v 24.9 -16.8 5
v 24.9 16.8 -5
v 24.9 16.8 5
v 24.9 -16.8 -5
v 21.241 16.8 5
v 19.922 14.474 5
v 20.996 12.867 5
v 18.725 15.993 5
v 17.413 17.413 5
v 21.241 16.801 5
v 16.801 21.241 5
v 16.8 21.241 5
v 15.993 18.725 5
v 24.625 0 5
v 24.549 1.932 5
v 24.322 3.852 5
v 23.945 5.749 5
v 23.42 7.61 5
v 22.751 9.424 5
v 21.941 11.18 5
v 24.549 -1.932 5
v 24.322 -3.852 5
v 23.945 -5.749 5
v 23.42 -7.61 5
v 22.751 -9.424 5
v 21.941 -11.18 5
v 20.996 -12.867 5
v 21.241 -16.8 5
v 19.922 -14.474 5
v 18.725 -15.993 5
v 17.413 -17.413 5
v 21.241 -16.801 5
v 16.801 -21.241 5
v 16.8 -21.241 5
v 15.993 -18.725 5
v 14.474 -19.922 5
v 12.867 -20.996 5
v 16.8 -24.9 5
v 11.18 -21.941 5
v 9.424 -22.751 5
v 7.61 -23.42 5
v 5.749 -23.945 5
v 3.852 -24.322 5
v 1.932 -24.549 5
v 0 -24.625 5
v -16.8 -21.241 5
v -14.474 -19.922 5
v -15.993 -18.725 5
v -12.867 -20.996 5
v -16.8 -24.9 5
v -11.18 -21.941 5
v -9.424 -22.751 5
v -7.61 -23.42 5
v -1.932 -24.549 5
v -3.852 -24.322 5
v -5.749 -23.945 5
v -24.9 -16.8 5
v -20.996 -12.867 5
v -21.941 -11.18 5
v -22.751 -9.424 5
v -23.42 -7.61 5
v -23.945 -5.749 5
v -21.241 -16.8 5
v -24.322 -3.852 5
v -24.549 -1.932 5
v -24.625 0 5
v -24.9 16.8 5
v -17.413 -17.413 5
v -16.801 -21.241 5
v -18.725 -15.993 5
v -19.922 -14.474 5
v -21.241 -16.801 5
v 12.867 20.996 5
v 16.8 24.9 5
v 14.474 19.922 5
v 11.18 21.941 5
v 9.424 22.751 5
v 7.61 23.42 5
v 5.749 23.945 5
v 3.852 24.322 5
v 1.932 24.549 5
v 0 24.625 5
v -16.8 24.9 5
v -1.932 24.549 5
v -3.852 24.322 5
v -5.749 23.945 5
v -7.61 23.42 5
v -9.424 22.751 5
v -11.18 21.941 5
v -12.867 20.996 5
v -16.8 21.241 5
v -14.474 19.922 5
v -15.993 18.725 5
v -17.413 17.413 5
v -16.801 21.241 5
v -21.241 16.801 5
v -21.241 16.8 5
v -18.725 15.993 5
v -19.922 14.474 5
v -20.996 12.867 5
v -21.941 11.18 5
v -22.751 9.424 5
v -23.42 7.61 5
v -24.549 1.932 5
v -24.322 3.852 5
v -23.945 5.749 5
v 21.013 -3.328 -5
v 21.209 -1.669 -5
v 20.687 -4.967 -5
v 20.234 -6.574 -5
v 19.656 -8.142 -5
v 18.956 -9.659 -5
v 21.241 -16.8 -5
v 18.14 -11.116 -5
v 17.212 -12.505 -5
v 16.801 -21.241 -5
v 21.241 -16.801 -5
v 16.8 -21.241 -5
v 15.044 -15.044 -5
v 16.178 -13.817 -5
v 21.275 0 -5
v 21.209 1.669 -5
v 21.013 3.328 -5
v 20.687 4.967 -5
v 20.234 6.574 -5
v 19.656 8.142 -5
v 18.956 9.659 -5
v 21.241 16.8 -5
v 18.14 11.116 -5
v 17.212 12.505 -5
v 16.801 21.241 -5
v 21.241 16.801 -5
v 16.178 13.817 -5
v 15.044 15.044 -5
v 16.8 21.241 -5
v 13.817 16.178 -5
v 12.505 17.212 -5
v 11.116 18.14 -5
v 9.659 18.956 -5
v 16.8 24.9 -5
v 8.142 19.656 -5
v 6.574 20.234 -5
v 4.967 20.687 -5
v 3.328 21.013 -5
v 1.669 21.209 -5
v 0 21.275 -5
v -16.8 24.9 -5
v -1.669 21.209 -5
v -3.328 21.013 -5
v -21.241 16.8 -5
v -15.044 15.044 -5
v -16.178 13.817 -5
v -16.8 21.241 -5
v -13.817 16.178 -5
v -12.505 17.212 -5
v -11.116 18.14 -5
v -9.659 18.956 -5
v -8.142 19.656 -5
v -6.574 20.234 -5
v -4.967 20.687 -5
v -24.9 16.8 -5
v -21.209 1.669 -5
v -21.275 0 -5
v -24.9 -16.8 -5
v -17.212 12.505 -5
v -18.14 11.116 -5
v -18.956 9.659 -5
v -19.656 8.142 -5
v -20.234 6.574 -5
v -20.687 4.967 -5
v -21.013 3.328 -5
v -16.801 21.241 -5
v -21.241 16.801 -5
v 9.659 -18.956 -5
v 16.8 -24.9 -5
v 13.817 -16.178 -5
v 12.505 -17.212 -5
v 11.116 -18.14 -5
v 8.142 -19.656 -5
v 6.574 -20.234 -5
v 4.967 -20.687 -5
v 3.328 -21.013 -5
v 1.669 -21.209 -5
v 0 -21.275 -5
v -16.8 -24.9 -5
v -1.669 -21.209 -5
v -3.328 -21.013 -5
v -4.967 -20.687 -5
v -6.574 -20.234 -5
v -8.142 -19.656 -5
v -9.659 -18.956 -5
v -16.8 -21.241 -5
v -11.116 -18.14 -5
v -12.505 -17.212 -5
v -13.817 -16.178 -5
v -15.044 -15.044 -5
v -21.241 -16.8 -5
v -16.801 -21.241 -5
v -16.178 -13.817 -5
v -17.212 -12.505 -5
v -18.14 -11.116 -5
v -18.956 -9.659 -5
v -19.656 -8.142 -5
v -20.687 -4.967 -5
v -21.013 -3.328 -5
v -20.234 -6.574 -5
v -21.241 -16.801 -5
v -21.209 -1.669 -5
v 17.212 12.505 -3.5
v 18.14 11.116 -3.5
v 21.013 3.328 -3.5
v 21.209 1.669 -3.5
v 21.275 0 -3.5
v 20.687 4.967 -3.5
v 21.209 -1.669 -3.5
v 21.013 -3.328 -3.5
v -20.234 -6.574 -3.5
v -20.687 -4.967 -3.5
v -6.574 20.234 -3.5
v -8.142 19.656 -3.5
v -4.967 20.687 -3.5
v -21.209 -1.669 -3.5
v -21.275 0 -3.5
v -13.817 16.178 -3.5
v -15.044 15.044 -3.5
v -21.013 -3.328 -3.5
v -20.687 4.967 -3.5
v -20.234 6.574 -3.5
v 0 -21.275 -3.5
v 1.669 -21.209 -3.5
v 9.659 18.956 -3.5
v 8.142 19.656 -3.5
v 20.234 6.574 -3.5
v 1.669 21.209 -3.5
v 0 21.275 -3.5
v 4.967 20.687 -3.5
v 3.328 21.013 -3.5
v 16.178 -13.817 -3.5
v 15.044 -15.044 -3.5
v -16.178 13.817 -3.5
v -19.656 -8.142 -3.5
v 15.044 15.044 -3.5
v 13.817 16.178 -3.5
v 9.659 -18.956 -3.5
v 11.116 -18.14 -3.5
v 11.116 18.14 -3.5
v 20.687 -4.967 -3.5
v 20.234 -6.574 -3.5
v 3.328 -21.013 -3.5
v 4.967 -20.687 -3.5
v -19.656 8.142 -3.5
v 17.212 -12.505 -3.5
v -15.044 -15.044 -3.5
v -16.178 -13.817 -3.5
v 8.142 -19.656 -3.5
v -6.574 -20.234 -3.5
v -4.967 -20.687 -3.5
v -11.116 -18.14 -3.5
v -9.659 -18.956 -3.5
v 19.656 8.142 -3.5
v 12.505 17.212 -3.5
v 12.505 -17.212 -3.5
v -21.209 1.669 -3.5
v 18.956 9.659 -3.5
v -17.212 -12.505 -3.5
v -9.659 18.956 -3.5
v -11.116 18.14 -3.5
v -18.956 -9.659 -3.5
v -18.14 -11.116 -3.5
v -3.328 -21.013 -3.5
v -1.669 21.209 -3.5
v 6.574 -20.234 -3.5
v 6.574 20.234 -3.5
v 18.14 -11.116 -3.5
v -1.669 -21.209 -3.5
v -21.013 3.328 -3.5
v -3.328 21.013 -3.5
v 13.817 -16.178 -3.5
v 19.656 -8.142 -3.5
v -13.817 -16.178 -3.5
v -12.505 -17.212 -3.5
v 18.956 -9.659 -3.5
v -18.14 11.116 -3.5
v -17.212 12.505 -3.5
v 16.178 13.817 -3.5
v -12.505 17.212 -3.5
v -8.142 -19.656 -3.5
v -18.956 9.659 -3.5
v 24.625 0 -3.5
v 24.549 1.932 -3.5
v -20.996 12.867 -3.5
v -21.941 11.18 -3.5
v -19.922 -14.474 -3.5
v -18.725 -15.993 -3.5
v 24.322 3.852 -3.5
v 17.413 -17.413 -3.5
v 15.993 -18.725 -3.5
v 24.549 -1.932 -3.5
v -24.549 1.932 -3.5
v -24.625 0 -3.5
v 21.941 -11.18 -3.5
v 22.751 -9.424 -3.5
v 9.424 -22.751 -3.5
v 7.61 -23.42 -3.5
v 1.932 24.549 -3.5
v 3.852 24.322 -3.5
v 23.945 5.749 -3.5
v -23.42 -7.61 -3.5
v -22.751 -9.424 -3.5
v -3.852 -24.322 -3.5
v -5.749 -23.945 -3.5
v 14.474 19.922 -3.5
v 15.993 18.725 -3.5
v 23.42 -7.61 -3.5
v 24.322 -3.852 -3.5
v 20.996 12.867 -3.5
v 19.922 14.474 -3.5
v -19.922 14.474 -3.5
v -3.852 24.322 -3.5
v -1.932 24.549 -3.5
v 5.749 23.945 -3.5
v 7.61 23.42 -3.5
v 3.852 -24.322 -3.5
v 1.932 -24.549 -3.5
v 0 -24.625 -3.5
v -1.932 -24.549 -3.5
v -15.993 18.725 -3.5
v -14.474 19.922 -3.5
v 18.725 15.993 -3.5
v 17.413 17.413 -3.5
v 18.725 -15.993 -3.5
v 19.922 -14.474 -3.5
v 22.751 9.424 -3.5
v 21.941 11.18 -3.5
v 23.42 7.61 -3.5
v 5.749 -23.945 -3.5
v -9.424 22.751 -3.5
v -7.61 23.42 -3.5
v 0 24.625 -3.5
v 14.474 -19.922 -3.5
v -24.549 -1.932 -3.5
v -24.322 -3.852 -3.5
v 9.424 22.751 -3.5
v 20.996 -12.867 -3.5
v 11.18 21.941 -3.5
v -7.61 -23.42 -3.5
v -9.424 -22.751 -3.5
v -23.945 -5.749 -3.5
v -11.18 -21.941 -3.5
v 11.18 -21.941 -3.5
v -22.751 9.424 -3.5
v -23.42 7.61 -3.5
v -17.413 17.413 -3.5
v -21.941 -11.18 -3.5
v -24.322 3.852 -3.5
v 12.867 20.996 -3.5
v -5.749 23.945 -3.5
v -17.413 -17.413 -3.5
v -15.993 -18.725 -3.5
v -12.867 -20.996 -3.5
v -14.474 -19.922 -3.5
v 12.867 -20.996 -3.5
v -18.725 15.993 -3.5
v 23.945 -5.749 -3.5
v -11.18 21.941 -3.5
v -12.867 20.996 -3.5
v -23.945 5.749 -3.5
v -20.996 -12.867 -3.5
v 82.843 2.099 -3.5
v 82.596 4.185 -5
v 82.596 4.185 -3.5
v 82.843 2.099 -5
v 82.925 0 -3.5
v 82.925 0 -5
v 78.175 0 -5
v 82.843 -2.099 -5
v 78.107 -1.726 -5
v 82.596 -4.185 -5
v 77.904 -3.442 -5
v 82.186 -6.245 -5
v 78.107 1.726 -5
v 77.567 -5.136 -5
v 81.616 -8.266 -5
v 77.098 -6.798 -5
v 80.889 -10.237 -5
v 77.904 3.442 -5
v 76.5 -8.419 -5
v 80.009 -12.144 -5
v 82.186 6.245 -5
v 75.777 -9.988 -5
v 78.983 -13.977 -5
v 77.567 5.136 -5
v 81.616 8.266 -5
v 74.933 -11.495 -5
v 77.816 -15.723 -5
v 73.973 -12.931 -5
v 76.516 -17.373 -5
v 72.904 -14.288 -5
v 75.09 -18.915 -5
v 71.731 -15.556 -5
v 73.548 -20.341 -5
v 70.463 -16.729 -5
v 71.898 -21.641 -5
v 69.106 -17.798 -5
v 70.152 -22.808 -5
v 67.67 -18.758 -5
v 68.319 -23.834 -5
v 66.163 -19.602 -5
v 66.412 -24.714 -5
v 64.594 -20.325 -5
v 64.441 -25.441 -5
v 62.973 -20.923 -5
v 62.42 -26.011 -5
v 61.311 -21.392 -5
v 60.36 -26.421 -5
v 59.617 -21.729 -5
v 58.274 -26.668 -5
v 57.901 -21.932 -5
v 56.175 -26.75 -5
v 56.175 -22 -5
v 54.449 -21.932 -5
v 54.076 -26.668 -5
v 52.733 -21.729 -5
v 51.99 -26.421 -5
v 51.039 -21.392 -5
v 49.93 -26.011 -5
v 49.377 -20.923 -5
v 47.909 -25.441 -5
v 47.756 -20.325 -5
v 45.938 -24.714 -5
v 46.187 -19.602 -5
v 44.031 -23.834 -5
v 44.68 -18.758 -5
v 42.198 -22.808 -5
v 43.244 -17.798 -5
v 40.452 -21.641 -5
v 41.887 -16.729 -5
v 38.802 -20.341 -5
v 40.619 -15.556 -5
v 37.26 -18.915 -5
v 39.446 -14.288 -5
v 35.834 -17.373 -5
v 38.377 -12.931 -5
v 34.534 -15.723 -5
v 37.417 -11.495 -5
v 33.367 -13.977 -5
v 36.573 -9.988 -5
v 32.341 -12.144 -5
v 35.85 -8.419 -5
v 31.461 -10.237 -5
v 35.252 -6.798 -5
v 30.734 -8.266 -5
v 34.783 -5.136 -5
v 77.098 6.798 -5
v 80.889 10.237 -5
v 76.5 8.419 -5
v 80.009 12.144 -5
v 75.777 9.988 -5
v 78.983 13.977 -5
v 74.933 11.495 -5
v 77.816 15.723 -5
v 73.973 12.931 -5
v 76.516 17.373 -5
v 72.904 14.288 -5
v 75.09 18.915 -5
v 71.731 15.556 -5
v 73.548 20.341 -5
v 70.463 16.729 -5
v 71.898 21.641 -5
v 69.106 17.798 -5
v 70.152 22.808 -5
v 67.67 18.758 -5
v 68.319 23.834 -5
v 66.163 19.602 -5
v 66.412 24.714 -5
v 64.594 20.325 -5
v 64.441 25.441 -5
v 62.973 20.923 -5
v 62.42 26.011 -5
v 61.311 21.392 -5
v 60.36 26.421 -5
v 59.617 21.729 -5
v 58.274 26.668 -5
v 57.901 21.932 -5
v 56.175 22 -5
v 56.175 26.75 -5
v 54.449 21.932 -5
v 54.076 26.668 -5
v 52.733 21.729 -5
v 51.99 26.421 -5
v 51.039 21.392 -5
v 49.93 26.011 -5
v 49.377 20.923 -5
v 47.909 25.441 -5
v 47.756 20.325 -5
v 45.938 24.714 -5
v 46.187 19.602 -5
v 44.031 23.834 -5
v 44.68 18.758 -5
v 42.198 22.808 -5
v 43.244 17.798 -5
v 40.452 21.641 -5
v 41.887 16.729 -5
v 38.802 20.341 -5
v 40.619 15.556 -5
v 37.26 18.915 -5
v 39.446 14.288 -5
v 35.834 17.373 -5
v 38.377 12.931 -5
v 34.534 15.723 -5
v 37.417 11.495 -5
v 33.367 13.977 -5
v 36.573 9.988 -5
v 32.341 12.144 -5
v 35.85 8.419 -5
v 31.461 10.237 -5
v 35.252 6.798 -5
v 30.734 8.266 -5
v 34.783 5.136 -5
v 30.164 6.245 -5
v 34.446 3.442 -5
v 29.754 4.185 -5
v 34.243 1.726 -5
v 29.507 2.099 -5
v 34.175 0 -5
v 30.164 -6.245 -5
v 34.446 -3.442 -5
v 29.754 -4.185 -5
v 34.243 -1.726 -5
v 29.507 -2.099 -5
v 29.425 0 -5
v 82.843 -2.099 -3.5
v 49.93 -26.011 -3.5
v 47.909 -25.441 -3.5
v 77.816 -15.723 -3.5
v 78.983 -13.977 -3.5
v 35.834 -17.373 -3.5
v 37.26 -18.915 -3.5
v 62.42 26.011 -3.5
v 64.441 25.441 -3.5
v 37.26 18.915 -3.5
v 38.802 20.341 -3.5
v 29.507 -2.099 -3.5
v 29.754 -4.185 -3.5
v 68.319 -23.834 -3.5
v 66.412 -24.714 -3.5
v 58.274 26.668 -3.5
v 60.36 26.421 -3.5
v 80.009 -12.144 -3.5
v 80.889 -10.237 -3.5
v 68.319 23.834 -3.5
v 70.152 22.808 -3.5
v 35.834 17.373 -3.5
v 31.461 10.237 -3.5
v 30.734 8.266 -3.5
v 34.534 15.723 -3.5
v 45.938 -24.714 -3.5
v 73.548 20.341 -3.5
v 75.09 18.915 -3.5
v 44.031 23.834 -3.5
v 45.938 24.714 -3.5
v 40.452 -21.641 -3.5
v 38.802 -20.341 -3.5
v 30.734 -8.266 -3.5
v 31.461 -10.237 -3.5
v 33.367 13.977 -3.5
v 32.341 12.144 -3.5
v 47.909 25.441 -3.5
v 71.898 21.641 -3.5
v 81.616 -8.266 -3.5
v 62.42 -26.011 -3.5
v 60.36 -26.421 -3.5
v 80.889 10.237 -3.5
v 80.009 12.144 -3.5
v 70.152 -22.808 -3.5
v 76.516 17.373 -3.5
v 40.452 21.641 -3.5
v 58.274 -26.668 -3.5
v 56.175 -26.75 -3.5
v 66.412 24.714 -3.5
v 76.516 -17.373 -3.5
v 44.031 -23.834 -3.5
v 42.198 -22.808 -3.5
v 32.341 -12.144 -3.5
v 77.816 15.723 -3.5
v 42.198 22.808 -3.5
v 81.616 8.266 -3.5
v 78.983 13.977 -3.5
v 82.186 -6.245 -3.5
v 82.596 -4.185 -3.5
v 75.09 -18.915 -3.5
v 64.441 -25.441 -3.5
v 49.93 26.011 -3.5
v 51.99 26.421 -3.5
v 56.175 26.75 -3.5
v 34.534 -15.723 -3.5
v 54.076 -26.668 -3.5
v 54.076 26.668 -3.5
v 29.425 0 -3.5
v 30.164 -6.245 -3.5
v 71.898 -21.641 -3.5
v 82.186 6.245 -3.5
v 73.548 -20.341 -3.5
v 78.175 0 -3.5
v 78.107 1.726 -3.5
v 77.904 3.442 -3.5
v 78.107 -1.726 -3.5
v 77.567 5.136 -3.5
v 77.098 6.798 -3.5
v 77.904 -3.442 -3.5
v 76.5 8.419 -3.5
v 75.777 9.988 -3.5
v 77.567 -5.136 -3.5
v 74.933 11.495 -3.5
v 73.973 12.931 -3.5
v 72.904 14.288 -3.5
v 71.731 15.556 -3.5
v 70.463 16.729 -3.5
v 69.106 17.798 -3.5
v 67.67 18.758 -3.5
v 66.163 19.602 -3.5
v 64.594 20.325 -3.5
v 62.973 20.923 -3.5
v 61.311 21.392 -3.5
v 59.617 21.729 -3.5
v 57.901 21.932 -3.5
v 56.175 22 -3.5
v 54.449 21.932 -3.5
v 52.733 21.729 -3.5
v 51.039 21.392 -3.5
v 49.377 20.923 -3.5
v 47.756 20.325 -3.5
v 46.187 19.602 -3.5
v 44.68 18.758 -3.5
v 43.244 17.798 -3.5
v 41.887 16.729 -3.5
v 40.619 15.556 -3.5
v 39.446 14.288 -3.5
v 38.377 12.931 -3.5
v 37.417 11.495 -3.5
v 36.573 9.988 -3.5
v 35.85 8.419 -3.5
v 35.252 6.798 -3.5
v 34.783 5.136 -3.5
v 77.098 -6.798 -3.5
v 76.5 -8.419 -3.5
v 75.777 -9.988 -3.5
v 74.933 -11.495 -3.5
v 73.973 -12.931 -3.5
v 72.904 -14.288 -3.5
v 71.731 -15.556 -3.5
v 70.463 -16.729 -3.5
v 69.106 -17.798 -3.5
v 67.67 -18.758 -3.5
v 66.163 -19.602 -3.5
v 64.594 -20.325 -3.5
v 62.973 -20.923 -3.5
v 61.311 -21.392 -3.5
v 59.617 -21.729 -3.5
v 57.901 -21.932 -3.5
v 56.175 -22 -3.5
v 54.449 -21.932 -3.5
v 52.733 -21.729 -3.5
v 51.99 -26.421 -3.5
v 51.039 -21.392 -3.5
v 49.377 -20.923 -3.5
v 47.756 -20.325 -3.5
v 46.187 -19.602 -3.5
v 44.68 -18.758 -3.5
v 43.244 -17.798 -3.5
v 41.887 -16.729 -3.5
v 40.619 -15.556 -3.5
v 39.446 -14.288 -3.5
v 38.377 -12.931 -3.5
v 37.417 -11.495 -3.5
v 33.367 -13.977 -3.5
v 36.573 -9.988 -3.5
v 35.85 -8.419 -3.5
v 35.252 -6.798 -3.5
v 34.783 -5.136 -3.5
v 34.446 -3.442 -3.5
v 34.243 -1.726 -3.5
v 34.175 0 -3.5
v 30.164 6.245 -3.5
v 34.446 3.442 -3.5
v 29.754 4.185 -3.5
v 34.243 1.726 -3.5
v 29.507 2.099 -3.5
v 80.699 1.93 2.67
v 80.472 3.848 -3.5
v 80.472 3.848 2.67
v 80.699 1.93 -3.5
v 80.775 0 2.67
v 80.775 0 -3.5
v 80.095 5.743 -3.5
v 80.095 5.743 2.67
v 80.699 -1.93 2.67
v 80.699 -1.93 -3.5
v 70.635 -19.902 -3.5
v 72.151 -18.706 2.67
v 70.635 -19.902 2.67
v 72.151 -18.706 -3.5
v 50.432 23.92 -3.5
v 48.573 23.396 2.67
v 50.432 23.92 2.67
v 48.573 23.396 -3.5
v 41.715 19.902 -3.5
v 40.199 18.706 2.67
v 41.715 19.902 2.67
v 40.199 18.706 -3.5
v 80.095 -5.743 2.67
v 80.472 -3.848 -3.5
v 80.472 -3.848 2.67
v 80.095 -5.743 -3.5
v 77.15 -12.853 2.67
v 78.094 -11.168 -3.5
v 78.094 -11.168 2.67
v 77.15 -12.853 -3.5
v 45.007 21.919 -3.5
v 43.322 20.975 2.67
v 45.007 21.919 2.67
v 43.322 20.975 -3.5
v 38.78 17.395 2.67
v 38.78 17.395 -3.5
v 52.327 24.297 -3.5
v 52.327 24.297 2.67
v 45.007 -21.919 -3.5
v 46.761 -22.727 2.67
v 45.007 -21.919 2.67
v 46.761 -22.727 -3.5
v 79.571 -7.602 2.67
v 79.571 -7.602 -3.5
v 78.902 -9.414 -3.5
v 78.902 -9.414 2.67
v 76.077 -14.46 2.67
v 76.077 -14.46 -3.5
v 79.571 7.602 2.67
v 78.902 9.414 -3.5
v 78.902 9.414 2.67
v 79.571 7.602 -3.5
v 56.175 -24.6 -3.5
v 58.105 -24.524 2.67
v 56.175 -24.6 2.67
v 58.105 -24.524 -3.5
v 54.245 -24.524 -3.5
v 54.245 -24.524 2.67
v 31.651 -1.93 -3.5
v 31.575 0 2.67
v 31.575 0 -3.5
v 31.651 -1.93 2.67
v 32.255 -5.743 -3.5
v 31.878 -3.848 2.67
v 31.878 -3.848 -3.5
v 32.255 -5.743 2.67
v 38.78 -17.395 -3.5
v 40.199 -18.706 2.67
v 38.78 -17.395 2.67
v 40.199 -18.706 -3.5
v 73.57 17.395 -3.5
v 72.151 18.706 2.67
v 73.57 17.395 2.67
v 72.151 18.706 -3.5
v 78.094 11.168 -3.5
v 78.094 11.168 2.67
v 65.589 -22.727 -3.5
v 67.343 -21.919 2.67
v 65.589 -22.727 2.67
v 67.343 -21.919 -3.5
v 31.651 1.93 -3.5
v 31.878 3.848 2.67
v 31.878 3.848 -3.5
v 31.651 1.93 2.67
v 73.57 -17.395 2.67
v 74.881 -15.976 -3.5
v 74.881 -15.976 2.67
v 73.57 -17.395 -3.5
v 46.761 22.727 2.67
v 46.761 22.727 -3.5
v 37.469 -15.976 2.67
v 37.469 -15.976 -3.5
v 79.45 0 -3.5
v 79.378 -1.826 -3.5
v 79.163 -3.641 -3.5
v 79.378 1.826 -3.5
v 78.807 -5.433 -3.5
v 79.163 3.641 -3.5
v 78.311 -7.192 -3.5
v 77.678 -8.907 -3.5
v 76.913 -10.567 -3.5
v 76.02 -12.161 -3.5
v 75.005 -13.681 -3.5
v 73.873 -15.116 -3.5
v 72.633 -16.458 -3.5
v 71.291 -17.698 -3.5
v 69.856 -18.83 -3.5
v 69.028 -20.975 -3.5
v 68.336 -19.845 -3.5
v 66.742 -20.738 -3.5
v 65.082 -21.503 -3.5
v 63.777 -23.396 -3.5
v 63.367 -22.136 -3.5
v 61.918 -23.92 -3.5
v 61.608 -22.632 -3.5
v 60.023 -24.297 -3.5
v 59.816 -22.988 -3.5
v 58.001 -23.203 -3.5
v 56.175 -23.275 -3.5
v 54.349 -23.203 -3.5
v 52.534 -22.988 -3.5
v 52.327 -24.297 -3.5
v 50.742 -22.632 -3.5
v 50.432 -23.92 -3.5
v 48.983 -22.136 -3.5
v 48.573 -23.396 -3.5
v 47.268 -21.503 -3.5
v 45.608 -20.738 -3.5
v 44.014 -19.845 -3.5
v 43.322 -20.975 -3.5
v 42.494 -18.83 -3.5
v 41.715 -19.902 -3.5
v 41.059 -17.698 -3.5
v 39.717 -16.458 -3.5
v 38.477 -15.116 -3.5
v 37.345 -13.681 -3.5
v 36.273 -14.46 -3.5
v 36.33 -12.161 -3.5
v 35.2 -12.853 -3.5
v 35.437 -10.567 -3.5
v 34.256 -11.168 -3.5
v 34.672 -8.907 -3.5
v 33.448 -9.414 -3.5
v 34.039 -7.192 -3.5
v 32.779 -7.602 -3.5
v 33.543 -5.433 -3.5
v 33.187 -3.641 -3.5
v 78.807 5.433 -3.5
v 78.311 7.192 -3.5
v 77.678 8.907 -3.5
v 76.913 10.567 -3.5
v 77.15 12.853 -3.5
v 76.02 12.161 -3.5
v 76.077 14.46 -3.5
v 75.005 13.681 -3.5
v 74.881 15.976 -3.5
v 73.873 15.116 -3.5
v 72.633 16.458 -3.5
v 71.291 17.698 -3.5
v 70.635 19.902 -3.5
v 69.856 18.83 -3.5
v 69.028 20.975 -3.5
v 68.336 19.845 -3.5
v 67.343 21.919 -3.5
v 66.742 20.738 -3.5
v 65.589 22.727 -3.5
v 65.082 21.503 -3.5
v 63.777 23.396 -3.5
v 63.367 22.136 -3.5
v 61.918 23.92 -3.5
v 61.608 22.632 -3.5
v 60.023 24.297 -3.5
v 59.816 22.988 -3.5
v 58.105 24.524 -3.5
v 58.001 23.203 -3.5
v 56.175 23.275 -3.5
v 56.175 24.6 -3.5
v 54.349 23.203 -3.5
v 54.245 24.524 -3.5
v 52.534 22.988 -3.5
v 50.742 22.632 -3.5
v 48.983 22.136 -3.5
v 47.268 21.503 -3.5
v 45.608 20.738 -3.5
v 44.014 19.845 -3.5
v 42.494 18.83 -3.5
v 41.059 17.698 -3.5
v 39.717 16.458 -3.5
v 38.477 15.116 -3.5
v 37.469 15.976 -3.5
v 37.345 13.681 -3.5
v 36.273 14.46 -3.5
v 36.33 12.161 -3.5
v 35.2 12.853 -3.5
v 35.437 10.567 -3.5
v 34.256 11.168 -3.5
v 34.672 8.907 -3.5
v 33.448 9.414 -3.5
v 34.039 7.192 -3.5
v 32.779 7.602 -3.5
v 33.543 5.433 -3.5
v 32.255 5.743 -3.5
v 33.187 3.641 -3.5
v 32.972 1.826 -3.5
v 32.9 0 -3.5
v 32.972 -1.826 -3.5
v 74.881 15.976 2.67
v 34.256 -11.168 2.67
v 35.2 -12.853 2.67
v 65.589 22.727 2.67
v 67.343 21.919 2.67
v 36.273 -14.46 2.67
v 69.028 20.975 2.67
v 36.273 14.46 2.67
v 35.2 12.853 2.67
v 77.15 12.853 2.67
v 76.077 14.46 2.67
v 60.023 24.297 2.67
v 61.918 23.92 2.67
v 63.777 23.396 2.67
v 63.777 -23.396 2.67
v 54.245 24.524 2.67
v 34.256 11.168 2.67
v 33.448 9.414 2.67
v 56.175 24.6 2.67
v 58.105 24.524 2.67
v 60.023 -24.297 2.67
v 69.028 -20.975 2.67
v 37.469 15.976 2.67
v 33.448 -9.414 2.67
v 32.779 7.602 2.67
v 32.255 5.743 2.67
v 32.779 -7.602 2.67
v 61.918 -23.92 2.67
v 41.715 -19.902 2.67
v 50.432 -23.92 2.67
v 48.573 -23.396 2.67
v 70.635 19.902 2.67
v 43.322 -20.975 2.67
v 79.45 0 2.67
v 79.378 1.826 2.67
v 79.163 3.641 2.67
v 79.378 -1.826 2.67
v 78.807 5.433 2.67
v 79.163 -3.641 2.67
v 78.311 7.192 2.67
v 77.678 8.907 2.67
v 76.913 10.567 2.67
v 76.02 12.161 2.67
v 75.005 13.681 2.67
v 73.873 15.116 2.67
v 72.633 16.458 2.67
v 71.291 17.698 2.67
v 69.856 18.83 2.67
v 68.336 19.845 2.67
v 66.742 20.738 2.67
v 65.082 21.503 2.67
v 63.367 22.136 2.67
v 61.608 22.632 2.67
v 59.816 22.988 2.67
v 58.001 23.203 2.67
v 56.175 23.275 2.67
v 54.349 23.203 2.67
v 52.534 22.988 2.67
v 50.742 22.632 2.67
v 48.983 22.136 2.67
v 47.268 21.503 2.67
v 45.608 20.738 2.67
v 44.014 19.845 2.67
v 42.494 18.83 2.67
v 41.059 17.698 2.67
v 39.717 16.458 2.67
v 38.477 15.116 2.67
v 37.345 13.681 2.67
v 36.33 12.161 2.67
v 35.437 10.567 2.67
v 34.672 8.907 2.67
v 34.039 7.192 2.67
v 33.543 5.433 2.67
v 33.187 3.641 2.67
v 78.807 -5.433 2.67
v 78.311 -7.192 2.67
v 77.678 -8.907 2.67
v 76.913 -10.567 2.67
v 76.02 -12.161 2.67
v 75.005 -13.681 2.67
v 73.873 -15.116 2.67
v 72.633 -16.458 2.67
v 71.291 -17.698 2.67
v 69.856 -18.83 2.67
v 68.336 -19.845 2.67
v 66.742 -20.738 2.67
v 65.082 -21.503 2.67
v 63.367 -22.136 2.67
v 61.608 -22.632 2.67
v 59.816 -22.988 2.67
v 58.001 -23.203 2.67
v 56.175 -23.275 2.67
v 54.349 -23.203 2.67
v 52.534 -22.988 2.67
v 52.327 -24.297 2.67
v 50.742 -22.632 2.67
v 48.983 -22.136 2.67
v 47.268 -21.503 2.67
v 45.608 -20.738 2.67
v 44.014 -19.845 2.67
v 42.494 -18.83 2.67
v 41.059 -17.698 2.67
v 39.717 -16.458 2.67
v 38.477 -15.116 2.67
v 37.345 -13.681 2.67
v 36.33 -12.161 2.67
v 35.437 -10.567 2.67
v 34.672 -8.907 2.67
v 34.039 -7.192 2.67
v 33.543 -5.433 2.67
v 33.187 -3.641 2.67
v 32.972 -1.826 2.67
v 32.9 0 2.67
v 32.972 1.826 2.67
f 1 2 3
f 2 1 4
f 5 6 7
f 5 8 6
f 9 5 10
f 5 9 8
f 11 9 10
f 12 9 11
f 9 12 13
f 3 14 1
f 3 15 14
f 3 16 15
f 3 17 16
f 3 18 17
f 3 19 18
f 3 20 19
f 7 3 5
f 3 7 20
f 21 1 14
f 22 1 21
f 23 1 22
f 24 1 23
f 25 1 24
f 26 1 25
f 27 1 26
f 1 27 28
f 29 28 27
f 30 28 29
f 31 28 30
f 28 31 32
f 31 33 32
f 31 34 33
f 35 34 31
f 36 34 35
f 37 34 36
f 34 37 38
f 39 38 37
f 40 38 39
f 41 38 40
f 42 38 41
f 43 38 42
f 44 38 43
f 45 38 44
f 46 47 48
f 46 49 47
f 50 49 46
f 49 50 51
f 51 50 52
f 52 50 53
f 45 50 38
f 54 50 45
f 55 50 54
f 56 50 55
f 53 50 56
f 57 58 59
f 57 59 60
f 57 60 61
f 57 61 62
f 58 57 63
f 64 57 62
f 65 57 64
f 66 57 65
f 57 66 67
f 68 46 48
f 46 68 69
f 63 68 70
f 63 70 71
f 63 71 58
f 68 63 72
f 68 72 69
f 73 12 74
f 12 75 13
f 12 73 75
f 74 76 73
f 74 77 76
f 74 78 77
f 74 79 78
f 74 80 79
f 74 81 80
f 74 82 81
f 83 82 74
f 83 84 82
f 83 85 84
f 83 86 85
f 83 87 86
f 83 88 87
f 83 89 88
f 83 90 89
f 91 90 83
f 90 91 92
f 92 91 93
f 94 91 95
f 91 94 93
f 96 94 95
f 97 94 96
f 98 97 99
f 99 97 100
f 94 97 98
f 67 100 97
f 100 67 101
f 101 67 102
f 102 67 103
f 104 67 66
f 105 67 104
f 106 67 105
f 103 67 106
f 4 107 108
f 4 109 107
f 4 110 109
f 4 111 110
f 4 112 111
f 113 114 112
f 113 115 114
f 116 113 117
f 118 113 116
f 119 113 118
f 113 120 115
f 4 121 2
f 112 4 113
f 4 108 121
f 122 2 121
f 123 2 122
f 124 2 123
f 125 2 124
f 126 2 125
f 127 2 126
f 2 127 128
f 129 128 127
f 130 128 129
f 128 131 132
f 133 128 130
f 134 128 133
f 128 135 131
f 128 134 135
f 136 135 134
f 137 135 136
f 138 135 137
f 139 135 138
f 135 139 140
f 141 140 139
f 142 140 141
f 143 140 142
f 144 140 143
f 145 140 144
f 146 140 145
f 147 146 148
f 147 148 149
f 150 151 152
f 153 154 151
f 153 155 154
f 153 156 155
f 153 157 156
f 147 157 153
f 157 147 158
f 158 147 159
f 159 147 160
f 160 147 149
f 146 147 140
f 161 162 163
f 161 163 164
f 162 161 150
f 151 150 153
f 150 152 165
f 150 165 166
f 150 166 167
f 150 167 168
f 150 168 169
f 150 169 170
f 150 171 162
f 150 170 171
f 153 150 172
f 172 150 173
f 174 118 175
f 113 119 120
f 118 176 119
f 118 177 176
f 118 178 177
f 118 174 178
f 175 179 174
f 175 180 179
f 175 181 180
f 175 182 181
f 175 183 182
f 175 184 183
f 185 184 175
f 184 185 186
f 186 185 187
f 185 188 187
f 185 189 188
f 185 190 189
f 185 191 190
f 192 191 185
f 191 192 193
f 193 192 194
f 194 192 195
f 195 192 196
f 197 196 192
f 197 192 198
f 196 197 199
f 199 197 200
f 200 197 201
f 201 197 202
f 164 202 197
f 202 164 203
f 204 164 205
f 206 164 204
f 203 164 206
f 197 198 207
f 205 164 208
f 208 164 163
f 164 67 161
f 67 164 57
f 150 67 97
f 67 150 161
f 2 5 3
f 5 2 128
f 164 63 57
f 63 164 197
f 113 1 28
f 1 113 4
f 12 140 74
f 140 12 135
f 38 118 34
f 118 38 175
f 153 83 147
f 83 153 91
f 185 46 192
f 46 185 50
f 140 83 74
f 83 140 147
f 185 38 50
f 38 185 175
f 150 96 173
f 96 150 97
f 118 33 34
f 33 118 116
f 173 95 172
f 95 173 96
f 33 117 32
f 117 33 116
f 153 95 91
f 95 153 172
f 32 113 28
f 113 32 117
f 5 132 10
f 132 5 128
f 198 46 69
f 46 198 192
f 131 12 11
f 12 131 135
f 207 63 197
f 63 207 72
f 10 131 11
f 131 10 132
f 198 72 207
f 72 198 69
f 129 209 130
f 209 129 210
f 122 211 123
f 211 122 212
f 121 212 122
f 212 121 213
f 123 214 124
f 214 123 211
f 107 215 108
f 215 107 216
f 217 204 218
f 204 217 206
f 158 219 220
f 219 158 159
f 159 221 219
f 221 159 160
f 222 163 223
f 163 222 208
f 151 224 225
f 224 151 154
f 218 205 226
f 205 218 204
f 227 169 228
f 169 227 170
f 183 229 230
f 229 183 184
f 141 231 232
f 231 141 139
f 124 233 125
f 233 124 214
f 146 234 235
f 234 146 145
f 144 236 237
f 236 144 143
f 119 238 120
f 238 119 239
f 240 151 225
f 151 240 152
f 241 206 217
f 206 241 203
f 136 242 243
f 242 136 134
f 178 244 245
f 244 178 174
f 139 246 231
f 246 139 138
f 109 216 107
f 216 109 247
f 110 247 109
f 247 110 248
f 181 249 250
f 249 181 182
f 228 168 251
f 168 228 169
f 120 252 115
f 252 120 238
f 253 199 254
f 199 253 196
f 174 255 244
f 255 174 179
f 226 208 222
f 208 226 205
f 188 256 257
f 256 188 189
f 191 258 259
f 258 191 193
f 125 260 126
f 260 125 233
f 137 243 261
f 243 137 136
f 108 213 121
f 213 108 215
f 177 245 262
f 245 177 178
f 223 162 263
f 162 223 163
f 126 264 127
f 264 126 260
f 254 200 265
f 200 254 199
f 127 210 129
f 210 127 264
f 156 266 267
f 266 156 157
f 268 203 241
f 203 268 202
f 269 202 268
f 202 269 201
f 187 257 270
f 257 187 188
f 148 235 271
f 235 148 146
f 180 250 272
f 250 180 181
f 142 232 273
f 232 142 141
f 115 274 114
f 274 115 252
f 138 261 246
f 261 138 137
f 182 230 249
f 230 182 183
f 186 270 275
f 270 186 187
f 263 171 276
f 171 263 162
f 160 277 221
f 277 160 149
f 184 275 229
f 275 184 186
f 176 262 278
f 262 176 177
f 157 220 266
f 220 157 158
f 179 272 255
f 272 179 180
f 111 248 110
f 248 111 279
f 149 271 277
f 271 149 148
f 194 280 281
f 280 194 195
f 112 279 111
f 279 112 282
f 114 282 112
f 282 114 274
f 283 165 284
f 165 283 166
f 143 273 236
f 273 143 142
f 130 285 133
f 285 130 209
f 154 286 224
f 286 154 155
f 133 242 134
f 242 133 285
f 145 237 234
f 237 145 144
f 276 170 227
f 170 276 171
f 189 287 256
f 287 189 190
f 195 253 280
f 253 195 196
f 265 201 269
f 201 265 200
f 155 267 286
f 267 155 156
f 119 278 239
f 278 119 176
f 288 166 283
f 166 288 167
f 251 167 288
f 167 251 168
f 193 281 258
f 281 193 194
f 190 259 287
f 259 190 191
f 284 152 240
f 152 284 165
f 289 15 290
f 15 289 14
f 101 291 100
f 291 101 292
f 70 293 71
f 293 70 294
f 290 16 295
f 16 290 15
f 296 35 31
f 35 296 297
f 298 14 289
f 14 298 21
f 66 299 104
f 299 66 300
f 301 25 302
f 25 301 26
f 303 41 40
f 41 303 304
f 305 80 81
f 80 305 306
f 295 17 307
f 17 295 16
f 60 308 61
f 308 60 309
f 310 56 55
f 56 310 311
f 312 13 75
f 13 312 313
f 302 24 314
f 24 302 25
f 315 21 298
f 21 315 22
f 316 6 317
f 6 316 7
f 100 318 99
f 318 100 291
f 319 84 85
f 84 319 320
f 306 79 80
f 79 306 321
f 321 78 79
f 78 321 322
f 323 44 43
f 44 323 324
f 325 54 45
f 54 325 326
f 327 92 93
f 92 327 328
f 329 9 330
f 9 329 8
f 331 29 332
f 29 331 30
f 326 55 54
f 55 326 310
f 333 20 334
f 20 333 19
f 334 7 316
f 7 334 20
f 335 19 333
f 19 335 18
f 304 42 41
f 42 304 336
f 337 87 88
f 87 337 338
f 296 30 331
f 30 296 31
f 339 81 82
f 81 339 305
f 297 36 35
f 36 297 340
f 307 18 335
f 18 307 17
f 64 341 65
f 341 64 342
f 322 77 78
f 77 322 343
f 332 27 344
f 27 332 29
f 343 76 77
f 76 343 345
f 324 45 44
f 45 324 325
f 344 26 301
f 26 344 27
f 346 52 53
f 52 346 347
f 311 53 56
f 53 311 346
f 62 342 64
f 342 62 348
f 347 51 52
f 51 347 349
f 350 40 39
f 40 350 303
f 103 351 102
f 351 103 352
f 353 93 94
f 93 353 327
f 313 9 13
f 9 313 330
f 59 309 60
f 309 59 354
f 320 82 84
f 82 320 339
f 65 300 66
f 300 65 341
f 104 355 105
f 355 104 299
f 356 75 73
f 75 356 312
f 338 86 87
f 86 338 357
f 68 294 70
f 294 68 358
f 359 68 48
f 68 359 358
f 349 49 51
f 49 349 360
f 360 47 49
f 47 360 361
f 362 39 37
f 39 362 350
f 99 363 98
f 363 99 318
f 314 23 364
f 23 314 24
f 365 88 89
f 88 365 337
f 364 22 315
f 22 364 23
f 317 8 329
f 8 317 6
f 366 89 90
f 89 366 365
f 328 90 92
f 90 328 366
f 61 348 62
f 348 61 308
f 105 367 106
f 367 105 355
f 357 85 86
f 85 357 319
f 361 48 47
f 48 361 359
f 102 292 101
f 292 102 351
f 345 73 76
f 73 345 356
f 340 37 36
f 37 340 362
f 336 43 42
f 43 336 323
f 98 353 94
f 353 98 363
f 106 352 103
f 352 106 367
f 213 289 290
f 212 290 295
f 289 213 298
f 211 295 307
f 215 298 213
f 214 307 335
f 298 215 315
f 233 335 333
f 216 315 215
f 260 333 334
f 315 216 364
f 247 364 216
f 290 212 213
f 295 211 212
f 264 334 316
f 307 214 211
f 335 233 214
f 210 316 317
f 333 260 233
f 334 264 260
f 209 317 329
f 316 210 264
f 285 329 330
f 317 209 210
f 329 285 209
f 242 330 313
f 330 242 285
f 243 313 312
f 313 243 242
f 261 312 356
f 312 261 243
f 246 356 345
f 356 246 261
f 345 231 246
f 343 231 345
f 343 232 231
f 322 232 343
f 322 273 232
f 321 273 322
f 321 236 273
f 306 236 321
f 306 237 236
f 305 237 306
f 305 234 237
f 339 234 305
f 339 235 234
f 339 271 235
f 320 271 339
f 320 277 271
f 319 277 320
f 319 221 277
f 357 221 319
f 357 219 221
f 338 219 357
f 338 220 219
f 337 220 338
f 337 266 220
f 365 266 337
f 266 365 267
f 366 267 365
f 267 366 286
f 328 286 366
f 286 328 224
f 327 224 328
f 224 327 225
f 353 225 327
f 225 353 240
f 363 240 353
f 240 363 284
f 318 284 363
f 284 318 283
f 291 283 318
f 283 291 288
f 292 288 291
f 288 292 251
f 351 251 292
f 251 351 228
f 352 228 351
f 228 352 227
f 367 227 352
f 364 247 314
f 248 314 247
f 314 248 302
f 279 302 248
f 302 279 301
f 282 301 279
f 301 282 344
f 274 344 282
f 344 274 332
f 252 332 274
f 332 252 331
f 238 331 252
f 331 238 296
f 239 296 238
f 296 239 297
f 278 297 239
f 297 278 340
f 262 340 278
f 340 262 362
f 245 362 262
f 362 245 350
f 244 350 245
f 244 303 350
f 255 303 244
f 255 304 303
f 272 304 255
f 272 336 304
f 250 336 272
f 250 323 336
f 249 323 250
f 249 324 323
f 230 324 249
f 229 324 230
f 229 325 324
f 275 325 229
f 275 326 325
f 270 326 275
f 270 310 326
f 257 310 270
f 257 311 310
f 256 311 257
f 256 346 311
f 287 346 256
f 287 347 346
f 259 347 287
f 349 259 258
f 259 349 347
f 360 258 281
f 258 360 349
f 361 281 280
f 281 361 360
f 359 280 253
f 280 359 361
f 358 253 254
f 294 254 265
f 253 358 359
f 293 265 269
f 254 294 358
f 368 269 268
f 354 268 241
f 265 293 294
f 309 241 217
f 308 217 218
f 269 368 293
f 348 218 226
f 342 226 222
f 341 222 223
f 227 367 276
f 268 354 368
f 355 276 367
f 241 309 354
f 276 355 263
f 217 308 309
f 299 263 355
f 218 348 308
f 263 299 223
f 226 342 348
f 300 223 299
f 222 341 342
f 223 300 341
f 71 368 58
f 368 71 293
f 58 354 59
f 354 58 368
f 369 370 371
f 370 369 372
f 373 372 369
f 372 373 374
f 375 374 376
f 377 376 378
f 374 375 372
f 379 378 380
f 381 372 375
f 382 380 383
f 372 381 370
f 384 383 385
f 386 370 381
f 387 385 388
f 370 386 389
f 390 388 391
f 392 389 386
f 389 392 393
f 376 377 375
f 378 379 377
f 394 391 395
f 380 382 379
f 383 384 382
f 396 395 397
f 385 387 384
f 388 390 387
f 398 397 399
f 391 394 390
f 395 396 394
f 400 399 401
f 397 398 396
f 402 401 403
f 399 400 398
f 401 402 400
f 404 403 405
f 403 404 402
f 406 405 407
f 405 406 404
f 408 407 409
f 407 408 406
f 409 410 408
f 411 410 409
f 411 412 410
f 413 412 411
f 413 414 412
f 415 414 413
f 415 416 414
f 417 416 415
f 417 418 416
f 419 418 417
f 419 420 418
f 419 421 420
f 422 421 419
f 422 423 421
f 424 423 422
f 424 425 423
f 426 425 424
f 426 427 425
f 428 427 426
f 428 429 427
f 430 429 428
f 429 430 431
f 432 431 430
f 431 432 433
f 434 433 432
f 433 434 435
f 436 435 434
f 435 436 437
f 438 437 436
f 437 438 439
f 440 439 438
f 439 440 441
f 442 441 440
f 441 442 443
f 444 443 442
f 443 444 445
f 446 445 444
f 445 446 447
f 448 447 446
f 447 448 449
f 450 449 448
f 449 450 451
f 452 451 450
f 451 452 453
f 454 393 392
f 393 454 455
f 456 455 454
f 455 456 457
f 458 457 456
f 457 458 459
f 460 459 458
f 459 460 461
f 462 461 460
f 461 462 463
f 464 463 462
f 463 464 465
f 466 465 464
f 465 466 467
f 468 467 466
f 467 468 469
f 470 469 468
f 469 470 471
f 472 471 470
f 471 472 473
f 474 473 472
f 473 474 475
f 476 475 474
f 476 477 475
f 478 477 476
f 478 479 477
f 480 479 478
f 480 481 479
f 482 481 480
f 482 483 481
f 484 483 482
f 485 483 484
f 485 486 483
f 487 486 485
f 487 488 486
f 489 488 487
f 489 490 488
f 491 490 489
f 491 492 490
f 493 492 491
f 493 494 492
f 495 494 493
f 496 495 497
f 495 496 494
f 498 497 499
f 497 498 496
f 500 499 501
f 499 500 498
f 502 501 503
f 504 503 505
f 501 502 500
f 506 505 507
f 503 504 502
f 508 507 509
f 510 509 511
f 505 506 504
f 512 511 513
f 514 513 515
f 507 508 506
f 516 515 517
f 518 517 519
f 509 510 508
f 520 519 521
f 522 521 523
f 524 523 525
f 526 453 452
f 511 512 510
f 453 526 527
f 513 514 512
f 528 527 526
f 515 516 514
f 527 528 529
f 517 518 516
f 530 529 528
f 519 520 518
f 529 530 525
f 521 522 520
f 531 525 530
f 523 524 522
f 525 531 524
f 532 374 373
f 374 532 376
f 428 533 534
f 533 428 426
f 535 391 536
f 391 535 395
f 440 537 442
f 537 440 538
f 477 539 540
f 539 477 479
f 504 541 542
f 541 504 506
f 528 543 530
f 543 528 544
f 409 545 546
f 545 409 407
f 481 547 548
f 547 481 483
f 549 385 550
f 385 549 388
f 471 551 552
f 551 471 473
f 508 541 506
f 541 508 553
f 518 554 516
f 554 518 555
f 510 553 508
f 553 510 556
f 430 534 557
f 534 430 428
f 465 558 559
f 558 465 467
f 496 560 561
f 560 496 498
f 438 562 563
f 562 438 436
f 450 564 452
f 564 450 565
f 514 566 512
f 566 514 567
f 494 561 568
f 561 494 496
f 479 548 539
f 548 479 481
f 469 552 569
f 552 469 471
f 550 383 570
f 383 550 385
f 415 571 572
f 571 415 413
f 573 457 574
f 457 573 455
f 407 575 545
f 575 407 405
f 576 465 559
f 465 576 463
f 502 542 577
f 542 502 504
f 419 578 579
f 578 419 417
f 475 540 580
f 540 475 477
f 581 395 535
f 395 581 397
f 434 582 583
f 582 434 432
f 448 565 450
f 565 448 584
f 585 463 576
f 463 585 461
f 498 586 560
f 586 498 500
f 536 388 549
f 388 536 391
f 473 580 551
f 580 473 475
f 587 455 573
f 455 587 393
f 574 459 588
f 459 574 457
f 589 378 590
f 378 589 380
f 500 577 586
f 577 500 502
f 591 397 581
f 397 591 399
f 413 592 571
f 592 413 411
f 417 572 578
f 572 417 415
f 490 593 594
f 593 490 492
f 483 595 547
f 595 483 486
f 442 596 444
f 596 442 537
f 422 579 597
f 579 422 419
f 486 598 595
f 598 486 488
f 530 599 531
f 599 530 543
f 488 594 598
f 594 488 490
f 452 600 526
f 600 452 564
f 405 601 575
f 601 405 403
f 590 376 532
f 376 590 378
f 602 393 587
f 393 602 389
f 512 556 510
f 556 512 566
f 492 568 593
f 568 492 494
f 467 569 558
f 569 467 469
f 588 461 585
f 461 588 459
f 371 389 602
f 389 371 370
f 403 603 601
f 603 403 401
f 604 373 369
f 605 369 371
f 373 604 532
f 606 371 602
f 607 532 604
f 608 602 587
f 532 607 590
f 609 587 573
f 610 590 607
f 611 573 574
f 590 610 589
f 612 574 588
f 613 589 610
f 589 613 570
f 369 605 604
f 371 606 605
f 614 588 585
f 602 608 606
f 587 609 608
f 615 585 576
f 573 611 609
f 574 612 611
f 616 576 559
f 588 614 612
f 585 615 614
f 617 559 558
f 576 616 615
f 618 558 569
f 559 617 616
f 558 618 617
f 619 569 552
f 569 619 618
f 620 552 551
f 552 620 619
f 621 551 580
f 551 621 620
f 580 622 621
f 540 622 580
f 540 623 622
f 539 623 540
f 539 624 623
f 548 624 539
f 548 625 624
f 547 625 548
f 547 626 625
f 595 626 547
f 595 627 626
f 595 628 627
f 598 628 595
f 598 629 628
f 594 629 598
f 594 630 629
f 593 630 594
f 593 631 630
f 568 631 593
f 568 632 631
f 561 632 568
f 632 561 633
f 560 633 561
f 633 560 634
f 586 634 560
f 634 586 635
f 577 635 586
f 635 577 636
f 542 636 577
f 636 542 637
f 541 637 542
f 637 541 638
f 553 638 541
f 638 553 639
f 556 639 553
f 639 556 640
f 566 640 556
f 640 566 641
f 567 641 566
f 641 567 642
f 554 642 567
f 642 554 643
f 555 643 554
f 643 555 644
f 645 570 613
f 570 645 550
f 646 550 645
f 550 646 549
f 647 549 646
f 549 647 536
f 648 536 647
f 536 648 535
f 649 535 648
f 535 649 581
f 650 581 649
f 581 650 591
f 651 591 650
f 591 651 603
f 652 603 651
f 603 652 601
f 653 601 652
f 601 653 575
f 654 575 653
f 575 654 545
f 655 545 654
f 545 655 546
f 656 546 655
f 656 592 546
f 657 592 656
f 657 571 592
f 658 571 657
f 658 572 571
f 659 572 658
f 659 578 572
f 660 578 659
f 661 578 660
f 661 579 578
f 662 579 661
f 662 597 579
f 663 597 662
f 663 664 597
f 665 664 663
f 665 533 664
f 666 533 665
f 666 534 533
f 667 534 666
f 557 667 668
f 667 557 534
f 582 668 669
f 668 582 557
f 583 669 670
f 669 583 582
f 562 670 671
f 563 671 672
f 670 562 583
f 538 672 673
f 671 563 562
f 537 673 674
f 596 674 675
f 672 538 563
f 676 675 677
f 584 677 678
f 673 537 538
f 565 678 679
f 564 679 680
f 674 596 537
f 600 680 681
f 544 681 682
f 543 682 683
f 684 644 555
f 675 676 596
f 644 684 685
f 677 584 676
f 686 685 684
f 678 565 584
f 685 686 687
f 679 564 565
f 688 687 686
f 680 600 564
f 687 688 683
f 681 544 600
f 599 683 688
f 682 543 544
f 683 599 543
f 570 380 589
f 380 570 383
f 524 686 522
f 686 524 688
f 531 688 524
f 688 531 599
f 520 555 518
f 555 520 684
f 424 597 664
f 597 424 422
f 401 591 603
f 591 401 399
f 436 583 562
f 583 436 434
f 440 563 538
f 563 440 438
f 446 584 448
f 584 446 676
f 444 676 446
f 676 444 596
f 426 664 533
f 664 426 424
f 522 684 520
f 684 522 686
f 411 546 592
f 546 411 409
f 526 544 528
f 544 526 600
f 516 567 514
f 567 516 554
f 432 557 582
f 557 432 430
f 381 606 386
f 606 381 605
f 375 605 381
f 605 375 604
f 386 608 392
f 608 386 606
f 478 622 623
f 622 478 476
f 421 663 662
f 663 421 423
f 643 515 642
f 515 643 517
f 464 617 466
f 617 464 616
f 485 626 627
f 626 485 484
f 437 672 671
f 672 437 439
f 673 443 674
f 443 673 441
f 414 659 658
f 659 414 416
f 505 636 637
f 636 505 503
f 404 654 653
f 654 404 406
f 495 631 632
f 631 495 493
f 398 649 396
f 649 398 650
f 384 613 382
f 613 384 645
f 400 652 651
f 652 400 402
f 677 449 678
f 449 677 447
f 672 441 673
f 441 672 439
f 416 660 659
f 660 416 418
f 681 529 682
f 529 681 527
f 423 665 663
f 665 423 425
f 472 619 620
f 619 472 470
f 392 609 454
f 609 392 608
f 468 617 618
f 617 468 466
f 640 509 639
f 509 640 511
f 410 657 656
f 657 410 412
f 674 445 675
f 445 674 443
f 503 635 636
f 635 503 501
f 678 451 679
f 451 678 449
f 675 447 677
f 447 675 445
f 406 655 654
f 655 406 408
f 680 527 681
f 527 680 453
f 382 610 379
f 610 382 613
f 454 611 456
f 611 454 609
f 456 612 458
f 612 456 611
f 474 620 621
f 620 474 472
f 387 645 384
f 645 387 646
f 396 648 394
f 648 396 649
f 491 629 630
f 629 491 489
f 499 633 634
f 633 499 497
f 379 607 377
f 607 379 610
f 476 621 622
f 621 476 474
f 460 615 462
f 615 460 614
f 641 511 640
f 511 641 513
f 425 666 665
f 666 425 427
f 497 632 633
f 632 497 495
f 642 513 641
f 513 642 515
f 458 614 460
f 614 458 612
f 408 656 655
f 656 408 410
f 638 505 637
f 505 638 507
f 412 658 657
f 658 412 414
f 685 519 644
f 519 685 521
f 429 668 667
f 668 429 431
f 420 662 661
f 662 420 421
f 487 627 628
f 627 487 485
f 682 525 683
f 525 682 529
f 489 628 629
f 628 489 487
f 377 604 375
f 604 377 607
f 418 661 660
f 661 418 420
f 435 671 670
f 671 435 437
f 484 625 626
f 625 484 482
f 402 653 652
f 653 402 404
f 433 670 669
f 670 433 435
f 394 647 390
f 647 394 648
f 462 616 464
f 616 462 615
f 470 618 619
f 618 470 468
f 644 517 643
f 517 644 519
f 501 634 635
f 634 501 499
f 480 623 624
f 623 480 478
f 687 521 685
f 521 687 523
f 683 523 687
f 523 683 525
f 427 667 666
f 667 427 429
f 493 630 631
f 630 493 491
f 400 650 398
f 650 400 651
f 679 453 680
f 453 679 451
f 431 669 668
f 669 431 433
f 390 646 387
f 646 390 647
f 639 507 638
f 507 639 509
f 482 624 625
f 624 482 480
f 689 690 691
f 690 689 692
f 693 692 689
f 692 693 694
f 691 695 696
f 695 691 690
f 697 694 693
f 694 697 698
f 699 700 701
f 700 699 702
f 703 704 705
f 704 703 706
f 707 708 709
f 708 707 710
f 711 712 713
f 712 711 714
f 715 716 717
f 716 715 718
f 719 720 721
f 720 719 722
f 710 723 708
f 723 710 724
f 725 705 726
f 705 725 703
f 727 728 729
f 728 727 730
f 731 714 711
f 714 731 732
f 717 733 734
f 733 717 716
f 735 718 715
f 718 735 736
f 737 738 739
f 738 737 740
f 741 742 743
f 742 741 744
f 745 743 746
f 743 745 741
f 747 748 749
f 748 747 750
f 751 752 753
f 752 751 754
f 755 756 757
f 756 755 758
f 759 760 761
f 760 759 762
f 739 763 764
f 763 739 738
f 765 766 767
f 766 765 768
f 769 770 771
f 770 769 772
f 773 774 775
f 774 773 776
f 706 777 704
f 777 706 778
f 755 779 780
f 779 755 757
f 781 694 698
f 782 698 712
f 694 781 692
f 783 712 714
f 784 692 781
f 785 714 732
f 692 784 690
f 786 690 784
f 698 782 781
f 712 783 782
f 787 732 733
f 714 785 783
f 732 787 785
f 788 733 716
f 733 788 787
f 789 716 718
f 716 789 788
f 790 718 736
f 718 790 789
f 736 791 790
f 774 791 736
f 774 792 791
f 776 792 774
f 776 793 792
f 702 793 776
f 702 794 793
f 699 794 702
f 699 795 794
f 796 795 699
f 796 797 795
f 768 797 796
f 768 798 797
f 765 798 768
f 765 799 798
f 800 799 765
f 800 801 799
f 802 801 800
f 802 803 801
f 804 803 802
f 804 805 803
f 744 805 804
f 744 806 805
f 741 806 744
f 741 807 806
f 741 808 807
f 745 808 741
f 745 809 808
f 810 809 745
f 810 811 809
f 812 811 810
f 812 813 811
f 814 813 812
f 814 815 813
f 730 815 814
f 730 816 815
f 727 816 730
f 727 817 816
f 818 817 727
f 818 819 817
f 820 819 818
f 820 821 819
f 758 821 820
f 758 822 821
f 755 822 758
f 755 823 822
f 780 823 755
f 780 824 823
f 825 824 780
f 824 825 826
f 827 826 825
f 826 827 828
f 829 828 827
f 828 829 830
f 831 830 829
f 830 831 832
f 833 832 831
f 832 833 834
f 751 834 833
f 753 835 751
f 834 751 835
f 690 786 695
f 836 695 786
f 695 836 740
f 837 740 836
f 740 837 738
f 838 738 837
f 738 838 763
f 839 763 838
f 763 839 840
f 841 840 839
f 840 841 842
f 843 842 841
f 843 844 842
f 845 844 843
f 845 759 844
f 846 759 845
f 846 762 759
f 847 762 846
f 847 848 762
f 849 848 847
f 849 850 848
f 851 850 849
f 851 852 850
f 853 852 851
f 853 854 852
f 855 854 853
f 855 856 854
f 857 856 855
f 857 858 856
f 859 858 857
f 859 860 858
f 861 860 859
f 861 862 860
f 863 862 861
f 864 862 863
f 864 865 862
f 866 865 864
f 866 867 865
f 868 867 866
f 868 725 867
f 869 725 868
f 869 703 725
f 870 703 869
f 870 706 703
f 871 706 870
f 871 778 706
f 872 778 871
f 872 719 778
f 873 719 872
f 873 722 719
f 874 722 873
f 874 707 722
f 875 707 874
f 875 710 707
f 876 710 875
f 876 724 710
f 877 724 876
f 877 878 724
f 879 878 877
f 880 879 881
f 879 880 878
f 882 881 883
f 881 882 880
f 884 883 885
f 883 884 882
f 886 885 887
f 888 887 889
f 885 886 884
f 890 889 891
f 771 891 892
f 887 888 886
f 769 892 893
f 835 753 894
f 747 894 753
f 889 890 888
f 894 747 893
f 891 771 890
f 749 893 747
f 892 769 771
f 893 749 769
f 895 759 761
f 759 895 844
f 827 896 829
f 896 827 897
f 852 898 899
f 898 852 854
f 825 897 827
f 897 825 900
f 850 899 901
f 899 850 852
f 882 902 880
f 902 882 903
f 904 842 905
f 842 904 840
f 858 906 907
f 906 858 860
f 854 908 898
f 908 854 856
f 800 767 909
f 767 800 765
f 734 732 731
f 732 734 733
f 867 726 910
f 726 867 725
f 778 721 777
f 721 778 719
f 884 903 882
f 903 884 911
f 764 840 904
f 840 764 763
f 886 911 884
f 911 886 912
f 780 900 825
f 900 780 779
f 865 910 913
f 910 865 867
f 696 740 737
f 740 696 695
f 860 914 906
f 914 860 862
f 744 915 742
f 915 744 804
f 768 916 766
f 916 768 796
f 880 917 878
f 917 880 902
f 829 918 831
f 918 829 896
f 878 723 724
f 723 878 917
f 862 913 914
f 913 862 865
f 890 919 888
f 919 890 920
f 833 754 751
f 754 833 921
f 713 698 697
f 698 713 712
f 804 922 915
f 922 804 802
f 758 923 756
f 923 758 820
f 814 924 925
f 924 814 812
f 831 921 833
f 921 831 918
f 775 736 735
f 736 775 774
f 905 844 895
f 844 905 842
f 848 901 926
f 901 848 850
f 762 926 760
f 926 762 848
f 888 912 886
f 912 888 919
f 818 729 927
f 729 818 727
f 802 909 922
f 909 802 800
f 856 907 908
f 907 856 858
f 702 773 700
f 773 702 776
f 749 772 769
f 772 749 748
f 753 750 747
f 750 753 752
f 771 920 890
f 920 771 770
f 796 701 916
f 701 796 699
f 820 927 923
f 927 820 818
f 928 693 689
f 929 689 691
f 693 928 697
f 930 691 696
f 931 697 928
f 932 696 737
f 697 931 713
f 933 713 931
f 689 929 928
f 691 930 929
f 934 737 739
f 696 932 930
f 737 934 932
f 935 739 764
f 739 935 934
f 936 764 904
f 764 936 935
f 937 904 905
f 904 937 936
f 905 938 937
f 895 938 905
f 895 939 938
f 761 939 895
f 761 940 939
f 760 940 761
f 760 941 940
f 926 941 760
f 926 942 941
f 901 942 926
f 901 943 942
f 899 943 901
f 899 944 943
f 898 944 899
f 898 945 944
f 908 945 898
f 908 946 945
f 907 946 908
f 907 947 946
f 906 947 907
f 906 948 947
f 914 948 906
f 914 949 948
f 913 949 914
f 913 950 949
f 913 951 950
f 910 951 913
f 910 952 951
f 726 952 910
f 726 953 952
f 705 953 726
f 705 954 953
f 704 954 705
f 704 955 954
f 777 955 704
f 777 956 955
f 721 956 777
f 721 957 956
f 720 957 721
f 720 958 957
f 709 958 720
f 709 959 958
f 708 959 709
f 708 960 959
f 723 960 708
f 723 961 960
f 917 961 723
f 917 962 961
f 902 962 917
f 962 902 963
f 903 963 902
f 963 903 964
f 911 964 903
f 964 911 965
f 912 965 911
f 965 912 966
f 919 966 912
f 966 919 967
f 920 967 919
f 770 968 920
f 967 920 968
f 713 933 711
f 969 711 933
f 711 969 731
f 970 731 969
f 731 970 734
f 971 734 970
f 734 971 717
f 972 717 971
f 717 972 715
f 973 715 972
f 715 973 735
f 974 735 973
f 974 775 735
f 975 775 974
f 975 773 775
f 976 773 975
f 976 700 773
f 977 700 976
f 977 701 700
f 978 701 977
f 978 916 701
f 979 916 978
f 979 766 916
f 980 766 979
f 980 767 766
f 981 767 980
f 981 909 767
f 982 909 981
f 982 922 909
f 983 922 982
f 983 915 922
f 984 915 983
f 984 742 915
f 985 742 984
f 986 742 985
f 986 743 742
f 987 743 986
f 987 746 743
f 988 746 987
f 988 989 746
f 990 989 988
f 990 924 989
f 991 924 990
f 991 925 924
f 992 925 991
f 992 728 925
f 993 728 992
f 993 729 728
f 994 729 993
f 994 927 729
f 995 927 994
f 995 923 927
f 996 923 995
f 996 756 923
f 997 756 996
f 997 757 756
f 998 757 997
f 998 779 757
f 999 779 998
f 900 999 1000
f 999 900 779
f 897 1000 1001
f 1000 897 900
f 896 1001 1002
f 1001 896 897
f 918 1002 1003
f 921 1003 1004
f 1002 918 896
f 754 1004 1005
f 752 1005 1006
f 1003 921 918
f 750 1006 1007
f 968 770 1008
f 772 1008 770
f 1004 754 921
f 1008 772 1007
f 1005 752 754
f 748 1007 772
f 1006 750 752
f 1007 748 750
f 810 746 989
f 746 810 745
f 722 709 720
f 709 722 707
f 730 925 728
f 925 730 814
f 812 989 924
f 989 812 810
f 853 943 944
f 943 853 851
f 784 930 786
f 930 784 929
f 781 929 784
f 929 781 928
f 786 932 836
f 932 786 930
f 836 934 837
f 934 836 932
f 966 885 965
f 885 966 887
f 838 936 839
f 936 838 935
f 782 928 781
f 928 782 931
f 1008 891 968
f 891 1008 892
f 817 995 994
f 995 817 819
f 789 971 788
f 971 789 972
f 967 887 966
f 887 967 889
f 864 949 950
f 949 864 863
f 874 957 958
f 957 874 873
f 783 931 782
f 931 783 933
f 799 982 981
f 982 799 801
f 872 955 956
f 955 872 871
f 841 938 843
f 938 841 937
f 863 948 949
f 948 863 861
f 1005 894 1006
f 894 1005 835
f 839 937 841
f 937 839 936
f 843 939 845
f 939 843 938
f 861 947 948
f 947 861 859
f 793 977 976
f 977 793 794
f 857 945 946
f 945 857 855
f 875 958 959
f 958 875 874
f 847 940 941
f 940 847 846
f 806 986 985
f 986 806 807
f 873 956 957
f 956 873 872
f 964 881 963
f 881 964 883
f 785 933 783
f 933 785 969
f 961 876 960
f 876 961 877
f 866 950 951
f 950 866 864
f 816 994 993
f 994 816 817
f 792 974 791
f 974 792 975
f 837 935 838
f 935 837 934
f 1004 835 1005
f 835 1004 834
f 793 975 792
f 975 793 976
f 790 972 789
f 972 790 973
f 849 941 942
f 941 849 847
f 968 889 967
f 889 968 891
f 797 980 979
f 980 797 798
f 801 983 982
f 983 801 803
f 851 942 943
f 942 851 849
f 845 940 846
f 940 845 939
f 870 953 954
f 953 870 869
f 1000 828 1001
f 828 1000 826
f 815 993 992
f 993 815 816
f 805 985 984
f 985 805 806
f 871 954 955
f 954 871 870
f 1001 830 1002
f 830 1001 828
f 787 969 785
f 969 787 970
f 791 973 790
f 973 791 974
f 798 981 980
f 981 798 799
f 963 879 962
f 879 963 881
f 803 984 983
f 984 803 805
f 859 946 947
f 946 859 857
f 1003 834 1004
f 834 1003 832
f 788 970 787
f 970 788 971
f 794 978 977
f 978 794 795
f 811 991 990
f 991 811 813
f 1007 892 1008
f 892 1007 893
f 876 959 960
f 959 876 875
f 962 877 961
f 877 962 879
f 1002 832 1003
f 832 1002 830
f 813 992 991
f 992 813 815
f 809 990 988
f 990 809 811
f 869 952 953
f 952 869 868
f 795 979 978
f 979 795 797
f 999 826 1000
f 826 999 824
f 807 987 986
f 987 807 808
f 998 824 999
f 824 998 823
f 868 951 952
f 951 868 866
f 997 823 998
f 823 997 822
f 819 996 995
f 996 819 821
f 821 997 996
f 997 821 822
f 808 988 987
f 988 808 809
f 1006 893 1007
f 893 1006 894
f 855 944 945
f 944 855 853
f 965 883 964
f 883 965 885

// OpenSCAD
//Cube insert: Lens holder with clamp - for lenses with big diameter

/* [User Parameters] */
//Lens diameter - measure the diameter of your lens carefully and insert the value in millimetres. The holder can be used for lenses with a diameter from 42 mm to 50 mm.
lens_diameter = 48.55; //[42:0.01:50]
//Edge thickness - measure the thickness of your lens as close to the outer edge as possible.
lens_edge_thickness = 2.33; //[0.5:0.01:10]
// Which part would you like to print?
part = "first"; // [first:Both - Holder AND Clamp,second:Holder ONLY,third:Clamp ONLY]
// Is this insert for a 3D printed cube or for a cube produced by injection molding?
3D_printed_cube = "3Dprint"; // [3Dprint,IM]

/* [Hiden] */
$fn = 80;
eps = .002;
a = 49.8;
b = 33.6;
c = 6.28;
d = 53.8;
h = lens_edge_thickness < 4.1 ? 10 : lens_edge_thickness+6; //holder height
h1 = h - 1.5 - lens_edge_thickness; //clamp rims height
t = 1.5; //clamp ring thickness
IM_offset = 3D_printed_cube == "3Dprint" ? 0 : 0.2;

print_part();

module print_part() {   //choose part to print holder/clamp/both
	if (part == "first") {
		lens_holder();
        lens_clamp();
	} else if (part == "second") {
		lens_holder();
	} else if (part == "third") {
		lens_clamp();
	} 
}
module lens_holder () {
    difference(){
        union() {   //basic insert design
            cube([a,b+2*IM_offset,h], center=true);
            cube([b+2*IM_offset,a,h], center=true);
            rotate(a=[0,0,45]){
                cube([c,d+2*IM_offset,h], center=true);
            }
            rotate(a=[0,0,-45]){
                cube([c,d+2*IM_offset,h], center=true);
            }
        }
        union() {
            cylinder(h+eps,d=lens_diameter-6, center = true); //hole
            translate([0,0,1.5]){
                cylinder(h,d=lens_diameter+0.7, center = true); //rim to hold the lens
            }
        }
    } 
}

module lens_clamp() {
    translate([a/2+lens_diameter/2+7,0,-(h-t)/2]){
        difference(){   //bottom ring
            cylinder(t, d=53.5, center = true);
            cylinder(t+eps, d=44, center = true);
        }
        translate([0,0,+(h1+t)/2]){
            difference(){   //rim
                cylinder(h1,d=lens_diameter+0.65, center = true);
                cylinder(h1+eps,d=lens_diameter-2, center = true);
            }
            }
        }
    }
